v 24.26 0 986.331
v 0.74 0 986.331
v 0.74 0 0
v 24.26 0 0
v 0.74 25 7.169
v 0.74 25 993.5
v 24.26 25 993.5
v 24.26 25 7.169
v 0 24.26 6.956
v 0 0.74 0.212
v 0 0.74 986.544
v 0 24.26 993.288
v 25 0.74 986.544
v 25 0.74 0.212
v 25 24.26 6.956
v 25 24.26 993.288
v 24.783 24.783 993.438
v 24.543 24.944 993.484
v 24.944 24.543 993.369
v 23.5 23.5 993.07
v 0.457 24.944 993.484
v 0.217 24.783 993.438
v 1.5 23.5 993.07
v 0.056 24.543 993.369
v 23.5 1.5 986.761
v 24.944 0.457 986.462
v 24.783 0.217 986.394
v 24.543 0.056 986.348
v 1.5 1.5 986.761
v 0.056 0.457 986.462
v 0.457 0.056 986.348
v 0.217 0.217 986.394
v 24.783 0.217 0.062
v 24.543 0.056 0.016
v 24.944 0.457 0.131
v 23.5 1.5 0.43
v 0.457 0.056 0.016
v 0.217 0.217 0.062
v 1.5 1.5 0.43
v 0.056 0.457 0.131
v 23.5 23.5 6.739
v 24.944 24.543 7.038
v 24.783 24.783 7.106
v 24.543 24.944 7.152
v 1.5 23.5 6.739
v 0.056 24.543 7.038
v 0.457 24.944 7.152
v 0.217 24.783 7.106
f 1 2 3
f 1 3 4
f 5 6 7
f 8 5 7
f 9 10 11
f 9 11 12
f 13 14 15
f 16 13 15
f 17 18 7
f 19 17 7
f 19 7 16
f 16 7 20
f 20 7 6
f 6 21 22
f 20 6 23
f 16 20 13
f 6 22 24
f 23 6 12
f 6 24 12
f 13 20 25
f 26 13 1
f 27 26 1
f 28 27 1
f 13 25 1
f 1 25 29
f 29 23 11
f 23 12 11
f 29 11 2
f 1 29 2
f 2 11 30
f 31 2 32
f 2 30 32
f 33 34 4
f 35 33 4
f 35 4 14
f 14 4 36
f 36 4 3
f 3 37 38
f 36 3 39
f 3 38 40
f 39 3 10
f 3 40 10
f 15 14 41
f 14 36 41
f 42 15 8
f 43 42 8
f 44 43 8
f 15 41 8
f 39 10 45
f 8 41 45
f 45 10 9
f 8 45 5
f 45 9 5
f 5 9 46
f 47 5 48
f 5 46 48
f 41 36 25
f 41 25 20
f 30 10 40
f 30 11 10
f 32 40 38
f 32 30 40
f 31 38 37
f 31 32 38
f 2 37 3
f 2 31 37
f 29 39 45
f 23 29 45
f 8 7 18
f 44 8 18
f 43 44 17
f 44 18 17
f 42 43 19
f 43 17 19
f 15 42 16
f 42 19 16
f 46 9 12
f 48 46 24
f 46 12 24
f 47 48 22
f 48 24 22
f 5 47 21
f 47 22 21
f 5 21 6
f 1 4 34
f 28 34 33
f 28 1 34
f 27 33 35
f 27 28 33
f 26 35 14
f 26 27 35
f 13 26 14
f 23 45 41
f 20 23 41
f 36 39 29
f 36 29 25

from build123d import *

# Parameters (mm, degrees)
SKETCH_W     = 25
SKETCH_H     = 25
SKETCH_W_2   = 22
SKETCH_H_2   = 22
PAD_DEPTH    = 993.5
FILLET_R     = 0.74
POCKET_DEPTH = 25.001


with BuildPart() as part:
    # Sketch → Pad (new body)
    with BuildSketch(Plane.XY):
        with Locations((12.5, 12.5)):
            Rectangle(SKETCH_W, SKETCH_H)
        with Locations((12.5, 12.5)):
            Rectangle(SKETCH_W_2, SKETCH_H_2, mode=Mode.SUBTRACT)
    extrude(amount=PAD_DEPTH)

    # Fillet
    fillet_edges = [part.edges().sort_by_distance(p)[0] for p in [
        (25, 0, 496.75),
        (0, 0, 496.75),
        (25, 25, 496.75),
        (0, 25, 496.75),
    ]]
    fillet(fillet_edges, radius=FILLET_R)

    # Sketch001 (on Face6 of Fillet) → Pocket (cut, through all)
    with BuildSketch(Plane(origin=(0, 0, 0), x_dir=(0, -1, 0), z_dir=(-1, 0, 0))):
        Polygon((0, 0), (-42.302197, 12.12996), (-25.0585, -14.483582), align=None)
        Polygon((-25, 993.5), (23.399026, 979.621803), (15.807791, 1006.485657), align=None)
    extrude(amount=-POCKET_DEPTH, mode=Mode.SUBTRACT)


solid = part.part
